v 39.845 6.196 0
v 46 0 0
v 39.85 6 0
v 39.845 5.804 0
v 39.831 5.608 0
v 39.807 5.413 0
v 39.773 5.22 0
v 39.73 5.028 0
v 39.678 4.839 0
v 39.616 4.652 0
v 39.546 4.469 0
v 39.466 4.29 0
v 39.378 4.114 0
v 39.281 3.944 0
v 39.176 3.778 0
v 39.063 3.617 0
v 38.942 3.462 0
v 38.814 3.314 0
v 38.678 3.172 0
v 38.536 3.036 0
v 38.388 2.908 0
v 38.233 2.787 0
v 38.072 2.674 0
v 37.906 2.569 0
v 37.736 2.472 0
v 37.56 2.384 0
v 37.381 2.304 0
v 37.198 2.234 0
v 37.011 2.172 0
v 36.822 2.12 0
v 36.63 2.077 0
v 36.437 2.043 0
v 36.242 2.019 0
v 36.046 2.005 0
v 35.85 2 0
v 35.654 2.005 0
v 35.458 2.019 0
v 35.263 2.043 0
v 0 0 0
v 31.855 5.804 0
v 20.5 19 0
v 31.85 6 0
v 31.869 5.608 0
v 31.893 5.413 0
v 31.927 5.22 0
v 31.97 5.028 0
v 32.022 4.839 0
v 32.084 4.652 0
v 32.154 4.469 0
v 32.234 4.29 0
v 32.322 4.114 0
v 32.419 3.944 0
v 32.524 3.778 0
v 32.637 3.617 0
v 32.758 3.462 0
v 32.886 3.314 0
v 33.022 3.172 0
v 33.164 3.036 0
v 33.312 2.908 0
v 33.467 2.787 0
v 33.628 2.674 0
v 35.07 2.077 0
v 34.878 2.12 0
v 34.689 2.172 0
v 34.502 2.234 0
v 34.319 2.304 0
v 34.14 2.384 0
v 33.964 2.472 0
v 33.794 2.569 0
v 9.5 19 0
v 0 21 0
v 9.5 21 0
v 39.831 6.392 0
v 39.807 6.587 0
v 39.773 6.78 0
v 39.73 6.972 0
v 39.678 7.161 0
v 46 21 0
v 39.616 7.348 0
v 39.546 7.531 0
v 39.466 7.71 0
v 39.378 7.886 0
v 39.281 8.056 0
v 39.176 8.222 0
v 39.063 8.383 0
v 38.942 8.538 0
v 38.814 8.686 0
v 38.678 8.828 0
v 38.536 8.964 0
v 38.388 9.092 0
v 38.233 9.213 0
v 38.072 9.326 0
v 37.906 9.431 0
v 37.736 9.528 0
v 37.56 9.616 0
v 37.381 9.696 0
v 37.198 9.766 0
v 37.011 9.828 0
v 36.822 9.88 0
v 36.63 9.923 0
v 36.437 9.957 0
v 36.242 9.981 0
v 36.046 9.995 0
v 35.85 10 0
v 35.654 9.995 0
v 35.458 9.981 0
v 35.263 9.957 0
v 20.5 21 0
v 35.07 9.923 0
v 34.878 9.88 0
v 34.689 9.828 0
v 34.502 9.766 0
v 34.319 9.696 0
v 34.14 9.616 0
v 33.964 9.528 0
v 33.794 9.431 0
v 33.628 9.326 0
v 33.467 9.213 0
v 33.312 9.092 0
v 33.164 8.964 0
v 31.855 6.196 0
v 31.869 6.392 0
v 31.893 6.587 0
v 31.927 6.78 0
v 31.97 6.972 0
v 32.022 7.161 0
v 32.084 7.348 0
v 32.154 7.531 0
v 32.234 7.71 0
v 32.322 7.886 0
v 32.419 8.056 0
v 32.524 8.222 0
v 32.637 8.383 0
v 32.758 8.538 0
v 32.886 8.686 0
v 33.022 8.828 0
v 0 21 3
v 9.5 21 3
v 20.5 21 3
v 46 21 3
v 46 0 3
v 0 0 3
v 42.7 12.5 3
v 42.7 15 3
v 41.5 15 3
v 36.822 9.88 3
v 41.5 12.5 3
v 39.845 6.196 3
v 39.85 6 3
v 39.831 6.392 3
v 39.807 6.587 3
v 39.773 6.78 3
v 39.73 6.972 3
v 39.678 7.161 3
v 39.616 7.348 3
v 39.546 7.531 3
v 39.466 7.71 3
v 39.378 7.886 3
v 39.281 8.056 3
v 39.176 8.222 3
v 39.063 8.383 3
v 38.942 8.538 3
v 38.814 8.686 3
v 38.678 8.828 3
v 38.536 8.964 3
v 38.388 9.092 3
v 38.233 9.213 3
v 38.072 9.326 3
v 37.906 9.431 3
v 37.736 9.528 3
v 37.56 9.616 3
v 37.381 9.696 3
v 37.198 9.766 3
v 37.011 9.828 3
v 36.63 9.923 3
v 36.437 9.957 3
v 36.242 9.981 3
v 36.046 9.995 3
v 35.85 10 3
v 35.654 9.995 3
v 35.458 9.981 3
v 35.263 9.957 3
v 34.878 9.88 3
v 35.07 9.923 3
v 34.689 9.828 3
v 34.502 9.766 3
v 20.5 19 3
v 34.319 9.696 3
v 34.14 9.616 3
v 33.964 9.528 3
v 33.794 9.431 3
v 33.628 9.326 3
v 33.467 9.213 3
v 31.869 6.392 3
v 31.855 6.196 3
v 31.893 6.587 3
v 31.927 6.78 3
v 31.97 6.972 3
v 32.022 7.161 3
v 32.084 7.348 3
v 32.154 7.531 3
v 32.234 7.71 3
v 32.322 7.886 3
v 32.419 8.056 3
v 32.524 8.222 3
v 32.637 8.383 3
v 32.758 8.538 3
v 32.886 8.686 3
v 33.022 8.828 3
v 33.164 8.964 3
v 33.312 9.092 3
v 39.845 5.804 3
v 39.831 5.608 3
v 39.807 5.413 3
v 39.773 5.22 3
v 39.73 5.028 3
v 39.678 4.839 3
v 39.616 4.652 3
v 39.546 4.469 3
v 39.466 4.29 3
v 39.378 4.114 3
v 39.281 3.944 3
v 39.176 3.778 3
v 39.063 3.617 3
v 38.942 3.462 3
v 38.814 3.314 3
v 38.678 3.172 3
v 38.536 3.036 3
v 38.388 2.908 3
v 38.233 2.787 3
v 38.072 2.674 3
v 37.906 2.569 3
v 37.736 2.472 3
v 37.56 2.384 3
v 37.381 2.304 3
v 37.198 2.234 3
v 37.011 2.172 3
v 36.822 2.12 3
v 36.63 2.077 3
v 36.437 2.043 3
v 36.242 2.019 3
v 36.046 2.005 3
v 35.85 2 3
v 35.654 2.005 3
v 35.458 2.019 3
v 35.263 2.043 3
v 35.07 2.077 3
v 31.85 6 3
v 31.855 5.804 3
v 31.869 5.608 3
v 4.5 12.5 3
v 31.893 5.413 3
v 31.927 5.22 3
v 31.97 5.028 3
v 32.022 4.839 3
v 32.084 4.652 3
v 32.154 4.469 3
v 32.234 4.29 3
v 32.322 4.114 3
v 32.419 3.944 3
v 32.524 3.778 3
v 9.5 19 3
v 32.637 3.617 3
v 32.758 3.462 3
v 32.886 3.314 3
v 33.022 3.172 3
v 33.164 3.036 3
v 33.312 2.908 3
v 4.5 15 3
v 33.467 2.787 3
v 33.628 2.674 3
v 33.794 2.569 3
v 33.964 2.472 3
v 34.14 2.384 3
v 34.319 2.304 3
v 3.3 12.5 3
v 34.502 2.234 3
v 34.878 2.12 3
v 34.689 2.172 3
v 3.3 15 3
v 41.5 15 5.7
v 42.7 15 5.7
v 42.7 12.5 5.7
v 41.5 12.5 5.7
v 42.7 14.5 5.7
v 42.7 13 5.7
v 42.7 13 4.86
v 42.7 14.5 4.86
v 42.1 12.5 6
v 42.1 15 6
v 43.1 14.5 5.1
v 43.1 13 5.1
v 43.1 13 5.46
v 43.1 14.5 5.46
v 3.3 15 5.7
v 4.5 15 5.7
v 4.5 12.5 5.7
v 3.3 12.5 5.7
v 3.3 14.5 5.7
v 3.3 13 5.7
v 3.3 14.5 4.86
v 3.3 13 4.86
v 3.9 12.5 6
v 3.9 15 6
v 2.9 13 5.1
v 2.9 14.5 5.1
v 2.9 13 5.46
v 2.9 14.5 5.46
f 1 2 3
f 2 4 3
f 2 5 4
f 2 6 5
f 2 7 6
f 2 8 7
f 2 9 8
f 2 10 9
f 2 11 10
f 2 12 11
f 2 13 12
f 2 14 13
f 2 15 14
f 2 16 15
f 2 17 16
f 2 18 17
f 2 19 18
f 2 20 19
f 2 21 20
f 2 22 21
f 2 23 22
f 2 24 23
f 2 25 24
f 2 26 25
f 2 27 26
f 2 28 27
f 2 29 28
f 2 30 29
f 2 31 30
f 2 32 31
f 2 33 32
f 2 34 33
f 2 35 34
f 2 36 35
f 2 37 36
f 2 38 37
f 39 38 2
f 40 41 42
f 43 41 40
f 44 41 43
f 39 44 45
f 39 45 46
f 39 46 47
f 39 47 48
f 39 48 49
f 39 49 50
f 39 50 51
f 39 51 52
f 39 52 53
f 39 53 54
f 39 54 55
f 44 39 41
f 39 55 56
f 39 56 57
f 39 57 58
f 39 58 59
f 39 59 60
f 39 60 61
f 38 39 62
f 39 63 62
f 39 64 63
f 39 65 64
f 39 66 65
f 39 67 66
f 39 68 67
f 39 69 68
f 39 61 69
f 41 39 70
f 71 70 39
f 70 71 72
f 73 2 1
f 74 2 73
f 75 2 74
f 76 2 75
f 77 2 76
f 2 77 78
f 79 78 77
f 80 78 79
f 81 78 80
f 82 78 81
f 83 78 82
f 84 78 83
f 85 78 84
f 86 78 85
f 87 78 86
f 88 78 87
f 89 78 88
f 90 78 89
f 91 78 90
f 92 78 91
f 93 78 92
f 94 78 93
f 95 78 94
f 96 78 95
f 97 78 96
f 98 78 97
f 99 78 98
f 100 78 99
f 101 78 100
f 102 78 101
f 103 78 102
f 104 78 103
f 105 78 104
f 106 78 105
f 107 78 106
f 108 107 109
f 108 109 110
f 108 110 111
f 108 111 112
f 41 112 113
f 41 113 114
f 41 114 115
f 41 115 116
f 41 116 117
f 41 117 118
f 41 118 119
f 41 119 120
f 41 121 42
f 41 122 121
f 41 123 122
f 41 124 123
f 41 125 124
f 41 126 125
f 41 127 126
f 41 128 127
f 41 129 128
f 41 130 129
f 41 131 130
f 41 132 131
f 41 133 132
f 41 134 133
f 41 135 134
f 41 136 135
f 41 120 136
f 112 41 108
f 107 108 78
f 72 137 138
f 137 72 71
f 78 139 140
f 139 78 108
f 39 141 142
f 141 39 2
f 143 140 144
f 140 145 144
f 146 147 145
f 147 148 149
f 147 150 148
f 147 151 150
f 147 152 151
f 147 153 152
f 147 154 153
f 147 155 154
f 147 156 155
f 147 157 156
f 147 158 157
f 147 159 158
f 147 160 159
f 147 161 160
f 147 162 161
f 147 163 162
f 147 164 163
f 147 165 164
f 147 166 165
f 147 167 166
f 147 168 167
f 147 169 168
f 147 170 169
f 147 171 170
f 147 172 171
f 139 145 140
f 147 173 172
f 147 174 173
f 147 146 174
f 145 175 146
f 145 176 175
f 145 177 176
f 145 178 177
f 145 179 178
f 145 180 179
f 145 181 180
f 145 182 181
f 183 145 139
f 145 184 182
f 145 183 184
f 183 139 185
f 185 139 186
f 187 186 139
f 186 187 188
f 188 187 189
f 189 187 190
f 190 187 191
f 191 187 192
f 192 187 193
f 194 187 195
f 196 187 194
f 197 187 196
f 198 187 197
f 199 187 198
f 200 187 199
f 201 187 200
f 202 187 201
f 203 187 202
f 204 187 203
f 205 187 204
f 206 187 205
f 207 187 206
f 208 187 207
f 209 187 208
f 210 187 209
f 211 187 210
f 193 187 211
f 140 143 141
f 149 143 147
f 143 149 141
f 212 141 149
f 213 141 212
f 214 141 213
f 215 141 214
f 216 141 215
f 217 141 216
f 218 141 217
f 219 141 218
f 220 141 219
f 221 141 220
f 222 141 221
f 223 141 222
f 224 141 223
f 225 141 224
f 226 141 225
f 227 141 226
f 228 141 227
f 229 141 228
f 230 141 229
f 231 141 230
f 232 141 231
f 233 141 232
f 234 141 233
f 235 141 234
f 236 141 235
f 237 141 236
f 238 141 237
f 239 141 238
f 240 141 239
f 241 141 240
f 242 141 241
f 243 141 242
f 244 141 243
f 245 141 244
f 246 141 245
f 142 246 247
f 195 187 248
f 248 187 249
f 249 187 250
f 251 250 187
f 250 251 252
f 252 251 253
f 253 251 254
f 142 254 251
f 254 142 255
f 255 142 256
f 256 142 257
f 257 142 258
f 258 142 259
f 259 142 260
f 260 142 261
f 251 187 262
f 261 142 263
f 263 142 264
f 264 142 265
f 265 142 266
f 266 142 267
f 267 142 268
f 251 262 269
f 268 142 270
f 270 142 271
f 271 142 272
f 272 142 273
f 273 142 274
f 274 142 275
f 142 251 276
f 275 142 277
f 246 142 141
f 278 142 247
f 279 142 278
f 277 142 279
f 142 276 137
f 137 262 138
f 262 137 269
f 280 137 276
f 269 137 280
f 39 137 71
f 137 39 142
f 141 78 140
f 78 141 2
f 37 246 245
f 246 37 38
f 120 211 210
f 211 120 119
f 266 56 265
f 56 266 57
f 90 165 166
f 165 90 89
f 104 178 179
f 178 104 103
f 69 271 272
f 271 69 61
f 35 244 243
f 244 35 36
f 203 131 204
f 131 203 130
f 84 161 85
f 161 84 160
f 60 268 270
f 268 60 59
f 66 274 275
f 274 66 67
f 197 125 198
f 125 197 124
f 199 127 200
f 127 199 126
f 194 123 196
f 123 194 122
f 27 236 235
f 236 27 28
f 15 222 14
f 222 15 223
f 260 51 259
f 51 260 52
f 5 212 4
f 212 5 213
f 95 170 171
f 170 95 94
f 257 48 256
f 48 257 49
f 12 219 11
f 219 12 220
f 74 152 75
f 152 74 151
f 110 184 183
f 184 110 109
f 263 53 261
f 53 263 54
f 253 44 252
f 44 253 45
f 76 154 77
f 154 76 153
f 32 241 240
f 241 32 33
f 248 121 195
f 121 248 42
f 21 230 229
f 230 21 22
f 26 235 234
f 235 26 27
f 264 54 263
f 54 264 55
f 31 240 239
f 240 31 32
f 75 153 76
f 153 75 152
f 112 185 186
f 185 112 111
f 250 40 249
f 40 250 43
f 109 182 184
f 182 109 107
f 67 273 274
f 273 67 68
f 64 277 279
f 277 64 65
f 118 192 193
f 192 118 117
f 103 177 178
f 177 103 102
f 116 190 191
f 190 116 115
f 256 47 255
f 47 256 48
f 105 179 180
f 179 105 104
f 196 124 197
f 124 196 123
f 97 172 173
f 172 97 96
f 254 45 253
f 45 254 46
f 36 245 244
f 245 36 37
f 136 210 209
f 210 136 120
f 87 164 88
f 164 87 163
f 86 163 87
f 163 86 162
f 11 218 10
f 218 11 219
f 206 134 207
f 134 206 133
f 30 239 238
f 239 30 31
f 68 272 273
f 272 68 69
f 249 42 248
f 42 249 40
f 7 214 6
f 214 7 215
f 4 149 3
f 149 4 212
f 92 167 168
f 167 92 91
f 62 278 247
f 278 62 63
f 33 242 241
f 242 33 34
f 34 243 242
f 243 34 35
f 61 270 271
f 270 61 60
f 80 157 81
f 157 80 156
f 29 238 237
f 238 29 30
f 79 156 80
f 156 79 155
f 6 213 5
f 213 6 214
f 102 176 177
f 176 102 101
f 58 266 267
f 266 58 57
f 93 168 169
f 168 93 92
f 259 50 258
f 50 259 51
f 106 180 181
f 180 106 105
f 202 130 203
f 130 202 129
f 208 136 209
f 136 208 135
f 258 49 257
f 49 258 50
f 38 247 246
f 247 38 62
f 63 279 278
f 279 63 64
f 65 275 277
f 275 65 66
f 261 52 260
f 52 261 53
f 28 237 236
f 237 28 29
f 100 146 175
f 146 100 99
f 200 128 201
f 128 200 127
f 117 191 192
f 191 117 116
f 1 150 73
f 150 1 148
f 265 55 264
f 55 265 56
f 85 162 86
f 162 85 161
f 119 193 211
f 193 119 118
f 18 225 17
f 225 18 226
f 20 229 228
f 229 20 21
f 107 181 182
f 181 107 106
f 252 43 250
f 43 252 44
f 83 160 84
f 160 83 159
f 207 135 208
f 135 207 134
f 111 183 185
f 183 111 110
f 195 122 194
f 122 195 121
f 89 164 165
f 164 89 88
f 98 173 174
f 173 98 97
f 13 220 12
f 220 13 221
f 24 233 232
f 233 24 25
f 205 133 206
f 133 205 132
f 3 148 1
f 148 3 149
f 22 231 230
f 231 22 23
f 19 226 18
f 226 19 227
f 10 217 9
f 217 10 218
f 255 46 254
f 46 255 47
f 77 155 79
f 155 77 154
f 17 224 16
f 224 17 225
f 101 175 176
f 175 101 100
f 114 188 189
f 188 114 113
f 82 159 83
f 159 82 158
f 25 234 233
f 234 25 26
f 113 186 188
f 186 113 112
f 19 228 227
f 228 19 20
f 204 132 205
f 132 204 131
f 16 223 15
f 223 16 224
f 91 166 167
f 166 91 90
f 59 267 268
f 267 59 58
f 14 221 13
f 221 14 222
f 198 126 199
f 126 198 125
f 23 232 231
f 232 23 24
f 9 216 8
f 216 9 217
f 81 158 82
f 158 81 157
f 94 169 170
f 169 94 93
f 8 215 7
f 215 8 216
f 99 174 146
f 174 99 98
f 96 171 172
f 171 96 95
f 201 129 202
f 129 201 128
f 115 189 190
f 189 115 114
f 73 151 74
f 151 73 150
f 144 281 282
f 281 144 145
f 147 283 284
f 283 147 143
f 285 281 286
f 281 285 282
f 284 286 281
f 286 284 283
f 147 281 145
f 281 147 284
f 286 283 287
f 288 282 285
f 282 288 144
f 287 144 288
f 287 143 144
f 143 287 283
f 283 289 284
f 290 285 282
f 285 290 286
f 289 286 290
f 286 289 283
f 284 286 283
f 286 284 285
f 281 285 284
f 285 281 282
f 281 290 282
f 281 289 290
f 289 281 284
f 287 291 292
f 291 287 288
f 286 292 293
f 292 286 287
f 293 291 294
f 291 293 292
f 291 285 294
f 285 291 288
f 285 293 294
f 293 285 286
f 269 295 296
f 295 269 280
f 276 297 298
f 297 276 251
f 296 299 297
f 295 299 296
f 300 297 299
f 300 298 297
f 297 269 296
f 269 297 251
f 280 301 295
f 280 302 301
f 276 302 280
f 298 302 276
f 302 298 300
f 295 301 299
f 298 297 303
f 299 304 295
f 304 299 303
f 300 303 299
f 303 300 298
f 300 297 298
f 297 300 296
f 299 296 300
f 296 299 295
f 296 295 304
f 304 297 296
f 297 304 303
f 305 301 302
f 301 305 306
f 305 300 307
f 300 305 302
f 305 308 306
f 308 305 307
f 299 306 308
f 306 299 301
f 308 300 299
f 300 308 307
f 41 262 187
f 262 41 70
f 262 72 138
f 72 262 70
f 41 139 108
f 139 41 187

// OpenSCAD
// Removable front cover for esp_base_v6.
//
// Assembly coordinates match esp_base_v6-Body.stl:
//   x = enclosure length, y = enclosure width, z = height.
// The plate occupies the existing 3 mm ledge at x=63..66 and z=3..24.
// Two cantilever fingers grip the lower inner side walls without entering the
// perfboard rail zone, whose lower edge is at z=18.25 mm.

$fn = 128;

base_front_x = 66;
wall_front_x = 63;
base_top_z = 3;
enclosure_top_z = 24;
enclosure_y_min = -46;
enclosure_y_max = 0;

hole_diameter = 8;
hole_center_y = -35.85;
hole_center_z = 9;

clip_x_tip = 60;
clip_x_body_start = 60.3;
clip_x_root = 63.5;
clip_z_min = 15.5;
clip_z_max = 18;
clip_bump_z_min = 16;
clip_bump_z_max = 17.5;
clip_body_thickness = 1.2;
clip_body_clearance = 0.30;
clip_interference = 0.10;

left_inner_wall_y = -43;
left_outer_body_y = left_inner_wall_y + clip_body_clearance;
left_inner_body_y = left_outer_body_y + clip_body_thickness;

module vertical_prism(points, z_min, z_max) {
    translate([0, 0, z_min])
        linear_extrude(height = z_max - z_min)
            polygon(points = points);
}

module pierced_plate() {
    difference() {
        translate([wall_front_x, enclosure_y_min, base_top_z])
            cube([
                base_front_x - wall_front_x,
                enclosure_y_max - enclosure_y_min,
                enclosure_top_z - base_top_z
            ]);
        translate([wall_front_x - 0.5, hole_center_y, hole_center_z])
            rotate([0, 90, 0])
                cylinder(h = base_front_x - wall_front_x + 1,
                         d = hole_diameter);
    }
}

module left_clip() {
    translate([clip_x_body_start, left_outer_body_y, clip_z_min])
        cube([
            clip_x_root - clip_x_body_start,
            clip_body_thickness,
            clip_z_max - clip_z_min
        ]);

    vertical_prism([
        [clip_x_tip, (left_outer_body_y + left_inner_body_y) / 2],
        [clip_x_body_start, left_outer_body_y],
        [clip_x_body_start, left_inner_body_y]
    ], clip_z_min, clip_z_max);

    vertical_prism([
        [60.3, left_outer_body_y],
        [61.14, left_outer_body_y],
        [60.9, left_inner_wall_y - clip_interference],
        [60.54, left_inner_wall_y - clip_interference]
    ], clip_bump_z_min, clip_bump_z_max);
}

module right_clip() {
    mirror([0, 1, 0])
        translate([0, 46, 0])
            left_clip();
}

module unnotched_cover() {
    union() {
        pierced_plate();
        left_clip();
        right_clip();
    }
}

module print_ready_cover() {
    // Assembly (x,y,z) -> print (-y, z-3, 66-x), putting the visible face
    // flat on the build plate and the flexible fingers upward.
    multmatrix([
        [ 0, -1,  0,  0],
        [ 0,  0,  1, -3],
        [-1,  0,  0, 66],
        [ 0,  0,  0,  1]
    ]) assembled_cover();
}

print_ready_cover();

// Top notch: 11 mm wide, 2 mm deep; 9.5 mm from outside-view right edge.
module assembled_cover() {
    difference() {
        unnotched_cover();
        translate([62.9, -20.5, 22]) cube([3.2, 11, 2.1]);
    }
}
